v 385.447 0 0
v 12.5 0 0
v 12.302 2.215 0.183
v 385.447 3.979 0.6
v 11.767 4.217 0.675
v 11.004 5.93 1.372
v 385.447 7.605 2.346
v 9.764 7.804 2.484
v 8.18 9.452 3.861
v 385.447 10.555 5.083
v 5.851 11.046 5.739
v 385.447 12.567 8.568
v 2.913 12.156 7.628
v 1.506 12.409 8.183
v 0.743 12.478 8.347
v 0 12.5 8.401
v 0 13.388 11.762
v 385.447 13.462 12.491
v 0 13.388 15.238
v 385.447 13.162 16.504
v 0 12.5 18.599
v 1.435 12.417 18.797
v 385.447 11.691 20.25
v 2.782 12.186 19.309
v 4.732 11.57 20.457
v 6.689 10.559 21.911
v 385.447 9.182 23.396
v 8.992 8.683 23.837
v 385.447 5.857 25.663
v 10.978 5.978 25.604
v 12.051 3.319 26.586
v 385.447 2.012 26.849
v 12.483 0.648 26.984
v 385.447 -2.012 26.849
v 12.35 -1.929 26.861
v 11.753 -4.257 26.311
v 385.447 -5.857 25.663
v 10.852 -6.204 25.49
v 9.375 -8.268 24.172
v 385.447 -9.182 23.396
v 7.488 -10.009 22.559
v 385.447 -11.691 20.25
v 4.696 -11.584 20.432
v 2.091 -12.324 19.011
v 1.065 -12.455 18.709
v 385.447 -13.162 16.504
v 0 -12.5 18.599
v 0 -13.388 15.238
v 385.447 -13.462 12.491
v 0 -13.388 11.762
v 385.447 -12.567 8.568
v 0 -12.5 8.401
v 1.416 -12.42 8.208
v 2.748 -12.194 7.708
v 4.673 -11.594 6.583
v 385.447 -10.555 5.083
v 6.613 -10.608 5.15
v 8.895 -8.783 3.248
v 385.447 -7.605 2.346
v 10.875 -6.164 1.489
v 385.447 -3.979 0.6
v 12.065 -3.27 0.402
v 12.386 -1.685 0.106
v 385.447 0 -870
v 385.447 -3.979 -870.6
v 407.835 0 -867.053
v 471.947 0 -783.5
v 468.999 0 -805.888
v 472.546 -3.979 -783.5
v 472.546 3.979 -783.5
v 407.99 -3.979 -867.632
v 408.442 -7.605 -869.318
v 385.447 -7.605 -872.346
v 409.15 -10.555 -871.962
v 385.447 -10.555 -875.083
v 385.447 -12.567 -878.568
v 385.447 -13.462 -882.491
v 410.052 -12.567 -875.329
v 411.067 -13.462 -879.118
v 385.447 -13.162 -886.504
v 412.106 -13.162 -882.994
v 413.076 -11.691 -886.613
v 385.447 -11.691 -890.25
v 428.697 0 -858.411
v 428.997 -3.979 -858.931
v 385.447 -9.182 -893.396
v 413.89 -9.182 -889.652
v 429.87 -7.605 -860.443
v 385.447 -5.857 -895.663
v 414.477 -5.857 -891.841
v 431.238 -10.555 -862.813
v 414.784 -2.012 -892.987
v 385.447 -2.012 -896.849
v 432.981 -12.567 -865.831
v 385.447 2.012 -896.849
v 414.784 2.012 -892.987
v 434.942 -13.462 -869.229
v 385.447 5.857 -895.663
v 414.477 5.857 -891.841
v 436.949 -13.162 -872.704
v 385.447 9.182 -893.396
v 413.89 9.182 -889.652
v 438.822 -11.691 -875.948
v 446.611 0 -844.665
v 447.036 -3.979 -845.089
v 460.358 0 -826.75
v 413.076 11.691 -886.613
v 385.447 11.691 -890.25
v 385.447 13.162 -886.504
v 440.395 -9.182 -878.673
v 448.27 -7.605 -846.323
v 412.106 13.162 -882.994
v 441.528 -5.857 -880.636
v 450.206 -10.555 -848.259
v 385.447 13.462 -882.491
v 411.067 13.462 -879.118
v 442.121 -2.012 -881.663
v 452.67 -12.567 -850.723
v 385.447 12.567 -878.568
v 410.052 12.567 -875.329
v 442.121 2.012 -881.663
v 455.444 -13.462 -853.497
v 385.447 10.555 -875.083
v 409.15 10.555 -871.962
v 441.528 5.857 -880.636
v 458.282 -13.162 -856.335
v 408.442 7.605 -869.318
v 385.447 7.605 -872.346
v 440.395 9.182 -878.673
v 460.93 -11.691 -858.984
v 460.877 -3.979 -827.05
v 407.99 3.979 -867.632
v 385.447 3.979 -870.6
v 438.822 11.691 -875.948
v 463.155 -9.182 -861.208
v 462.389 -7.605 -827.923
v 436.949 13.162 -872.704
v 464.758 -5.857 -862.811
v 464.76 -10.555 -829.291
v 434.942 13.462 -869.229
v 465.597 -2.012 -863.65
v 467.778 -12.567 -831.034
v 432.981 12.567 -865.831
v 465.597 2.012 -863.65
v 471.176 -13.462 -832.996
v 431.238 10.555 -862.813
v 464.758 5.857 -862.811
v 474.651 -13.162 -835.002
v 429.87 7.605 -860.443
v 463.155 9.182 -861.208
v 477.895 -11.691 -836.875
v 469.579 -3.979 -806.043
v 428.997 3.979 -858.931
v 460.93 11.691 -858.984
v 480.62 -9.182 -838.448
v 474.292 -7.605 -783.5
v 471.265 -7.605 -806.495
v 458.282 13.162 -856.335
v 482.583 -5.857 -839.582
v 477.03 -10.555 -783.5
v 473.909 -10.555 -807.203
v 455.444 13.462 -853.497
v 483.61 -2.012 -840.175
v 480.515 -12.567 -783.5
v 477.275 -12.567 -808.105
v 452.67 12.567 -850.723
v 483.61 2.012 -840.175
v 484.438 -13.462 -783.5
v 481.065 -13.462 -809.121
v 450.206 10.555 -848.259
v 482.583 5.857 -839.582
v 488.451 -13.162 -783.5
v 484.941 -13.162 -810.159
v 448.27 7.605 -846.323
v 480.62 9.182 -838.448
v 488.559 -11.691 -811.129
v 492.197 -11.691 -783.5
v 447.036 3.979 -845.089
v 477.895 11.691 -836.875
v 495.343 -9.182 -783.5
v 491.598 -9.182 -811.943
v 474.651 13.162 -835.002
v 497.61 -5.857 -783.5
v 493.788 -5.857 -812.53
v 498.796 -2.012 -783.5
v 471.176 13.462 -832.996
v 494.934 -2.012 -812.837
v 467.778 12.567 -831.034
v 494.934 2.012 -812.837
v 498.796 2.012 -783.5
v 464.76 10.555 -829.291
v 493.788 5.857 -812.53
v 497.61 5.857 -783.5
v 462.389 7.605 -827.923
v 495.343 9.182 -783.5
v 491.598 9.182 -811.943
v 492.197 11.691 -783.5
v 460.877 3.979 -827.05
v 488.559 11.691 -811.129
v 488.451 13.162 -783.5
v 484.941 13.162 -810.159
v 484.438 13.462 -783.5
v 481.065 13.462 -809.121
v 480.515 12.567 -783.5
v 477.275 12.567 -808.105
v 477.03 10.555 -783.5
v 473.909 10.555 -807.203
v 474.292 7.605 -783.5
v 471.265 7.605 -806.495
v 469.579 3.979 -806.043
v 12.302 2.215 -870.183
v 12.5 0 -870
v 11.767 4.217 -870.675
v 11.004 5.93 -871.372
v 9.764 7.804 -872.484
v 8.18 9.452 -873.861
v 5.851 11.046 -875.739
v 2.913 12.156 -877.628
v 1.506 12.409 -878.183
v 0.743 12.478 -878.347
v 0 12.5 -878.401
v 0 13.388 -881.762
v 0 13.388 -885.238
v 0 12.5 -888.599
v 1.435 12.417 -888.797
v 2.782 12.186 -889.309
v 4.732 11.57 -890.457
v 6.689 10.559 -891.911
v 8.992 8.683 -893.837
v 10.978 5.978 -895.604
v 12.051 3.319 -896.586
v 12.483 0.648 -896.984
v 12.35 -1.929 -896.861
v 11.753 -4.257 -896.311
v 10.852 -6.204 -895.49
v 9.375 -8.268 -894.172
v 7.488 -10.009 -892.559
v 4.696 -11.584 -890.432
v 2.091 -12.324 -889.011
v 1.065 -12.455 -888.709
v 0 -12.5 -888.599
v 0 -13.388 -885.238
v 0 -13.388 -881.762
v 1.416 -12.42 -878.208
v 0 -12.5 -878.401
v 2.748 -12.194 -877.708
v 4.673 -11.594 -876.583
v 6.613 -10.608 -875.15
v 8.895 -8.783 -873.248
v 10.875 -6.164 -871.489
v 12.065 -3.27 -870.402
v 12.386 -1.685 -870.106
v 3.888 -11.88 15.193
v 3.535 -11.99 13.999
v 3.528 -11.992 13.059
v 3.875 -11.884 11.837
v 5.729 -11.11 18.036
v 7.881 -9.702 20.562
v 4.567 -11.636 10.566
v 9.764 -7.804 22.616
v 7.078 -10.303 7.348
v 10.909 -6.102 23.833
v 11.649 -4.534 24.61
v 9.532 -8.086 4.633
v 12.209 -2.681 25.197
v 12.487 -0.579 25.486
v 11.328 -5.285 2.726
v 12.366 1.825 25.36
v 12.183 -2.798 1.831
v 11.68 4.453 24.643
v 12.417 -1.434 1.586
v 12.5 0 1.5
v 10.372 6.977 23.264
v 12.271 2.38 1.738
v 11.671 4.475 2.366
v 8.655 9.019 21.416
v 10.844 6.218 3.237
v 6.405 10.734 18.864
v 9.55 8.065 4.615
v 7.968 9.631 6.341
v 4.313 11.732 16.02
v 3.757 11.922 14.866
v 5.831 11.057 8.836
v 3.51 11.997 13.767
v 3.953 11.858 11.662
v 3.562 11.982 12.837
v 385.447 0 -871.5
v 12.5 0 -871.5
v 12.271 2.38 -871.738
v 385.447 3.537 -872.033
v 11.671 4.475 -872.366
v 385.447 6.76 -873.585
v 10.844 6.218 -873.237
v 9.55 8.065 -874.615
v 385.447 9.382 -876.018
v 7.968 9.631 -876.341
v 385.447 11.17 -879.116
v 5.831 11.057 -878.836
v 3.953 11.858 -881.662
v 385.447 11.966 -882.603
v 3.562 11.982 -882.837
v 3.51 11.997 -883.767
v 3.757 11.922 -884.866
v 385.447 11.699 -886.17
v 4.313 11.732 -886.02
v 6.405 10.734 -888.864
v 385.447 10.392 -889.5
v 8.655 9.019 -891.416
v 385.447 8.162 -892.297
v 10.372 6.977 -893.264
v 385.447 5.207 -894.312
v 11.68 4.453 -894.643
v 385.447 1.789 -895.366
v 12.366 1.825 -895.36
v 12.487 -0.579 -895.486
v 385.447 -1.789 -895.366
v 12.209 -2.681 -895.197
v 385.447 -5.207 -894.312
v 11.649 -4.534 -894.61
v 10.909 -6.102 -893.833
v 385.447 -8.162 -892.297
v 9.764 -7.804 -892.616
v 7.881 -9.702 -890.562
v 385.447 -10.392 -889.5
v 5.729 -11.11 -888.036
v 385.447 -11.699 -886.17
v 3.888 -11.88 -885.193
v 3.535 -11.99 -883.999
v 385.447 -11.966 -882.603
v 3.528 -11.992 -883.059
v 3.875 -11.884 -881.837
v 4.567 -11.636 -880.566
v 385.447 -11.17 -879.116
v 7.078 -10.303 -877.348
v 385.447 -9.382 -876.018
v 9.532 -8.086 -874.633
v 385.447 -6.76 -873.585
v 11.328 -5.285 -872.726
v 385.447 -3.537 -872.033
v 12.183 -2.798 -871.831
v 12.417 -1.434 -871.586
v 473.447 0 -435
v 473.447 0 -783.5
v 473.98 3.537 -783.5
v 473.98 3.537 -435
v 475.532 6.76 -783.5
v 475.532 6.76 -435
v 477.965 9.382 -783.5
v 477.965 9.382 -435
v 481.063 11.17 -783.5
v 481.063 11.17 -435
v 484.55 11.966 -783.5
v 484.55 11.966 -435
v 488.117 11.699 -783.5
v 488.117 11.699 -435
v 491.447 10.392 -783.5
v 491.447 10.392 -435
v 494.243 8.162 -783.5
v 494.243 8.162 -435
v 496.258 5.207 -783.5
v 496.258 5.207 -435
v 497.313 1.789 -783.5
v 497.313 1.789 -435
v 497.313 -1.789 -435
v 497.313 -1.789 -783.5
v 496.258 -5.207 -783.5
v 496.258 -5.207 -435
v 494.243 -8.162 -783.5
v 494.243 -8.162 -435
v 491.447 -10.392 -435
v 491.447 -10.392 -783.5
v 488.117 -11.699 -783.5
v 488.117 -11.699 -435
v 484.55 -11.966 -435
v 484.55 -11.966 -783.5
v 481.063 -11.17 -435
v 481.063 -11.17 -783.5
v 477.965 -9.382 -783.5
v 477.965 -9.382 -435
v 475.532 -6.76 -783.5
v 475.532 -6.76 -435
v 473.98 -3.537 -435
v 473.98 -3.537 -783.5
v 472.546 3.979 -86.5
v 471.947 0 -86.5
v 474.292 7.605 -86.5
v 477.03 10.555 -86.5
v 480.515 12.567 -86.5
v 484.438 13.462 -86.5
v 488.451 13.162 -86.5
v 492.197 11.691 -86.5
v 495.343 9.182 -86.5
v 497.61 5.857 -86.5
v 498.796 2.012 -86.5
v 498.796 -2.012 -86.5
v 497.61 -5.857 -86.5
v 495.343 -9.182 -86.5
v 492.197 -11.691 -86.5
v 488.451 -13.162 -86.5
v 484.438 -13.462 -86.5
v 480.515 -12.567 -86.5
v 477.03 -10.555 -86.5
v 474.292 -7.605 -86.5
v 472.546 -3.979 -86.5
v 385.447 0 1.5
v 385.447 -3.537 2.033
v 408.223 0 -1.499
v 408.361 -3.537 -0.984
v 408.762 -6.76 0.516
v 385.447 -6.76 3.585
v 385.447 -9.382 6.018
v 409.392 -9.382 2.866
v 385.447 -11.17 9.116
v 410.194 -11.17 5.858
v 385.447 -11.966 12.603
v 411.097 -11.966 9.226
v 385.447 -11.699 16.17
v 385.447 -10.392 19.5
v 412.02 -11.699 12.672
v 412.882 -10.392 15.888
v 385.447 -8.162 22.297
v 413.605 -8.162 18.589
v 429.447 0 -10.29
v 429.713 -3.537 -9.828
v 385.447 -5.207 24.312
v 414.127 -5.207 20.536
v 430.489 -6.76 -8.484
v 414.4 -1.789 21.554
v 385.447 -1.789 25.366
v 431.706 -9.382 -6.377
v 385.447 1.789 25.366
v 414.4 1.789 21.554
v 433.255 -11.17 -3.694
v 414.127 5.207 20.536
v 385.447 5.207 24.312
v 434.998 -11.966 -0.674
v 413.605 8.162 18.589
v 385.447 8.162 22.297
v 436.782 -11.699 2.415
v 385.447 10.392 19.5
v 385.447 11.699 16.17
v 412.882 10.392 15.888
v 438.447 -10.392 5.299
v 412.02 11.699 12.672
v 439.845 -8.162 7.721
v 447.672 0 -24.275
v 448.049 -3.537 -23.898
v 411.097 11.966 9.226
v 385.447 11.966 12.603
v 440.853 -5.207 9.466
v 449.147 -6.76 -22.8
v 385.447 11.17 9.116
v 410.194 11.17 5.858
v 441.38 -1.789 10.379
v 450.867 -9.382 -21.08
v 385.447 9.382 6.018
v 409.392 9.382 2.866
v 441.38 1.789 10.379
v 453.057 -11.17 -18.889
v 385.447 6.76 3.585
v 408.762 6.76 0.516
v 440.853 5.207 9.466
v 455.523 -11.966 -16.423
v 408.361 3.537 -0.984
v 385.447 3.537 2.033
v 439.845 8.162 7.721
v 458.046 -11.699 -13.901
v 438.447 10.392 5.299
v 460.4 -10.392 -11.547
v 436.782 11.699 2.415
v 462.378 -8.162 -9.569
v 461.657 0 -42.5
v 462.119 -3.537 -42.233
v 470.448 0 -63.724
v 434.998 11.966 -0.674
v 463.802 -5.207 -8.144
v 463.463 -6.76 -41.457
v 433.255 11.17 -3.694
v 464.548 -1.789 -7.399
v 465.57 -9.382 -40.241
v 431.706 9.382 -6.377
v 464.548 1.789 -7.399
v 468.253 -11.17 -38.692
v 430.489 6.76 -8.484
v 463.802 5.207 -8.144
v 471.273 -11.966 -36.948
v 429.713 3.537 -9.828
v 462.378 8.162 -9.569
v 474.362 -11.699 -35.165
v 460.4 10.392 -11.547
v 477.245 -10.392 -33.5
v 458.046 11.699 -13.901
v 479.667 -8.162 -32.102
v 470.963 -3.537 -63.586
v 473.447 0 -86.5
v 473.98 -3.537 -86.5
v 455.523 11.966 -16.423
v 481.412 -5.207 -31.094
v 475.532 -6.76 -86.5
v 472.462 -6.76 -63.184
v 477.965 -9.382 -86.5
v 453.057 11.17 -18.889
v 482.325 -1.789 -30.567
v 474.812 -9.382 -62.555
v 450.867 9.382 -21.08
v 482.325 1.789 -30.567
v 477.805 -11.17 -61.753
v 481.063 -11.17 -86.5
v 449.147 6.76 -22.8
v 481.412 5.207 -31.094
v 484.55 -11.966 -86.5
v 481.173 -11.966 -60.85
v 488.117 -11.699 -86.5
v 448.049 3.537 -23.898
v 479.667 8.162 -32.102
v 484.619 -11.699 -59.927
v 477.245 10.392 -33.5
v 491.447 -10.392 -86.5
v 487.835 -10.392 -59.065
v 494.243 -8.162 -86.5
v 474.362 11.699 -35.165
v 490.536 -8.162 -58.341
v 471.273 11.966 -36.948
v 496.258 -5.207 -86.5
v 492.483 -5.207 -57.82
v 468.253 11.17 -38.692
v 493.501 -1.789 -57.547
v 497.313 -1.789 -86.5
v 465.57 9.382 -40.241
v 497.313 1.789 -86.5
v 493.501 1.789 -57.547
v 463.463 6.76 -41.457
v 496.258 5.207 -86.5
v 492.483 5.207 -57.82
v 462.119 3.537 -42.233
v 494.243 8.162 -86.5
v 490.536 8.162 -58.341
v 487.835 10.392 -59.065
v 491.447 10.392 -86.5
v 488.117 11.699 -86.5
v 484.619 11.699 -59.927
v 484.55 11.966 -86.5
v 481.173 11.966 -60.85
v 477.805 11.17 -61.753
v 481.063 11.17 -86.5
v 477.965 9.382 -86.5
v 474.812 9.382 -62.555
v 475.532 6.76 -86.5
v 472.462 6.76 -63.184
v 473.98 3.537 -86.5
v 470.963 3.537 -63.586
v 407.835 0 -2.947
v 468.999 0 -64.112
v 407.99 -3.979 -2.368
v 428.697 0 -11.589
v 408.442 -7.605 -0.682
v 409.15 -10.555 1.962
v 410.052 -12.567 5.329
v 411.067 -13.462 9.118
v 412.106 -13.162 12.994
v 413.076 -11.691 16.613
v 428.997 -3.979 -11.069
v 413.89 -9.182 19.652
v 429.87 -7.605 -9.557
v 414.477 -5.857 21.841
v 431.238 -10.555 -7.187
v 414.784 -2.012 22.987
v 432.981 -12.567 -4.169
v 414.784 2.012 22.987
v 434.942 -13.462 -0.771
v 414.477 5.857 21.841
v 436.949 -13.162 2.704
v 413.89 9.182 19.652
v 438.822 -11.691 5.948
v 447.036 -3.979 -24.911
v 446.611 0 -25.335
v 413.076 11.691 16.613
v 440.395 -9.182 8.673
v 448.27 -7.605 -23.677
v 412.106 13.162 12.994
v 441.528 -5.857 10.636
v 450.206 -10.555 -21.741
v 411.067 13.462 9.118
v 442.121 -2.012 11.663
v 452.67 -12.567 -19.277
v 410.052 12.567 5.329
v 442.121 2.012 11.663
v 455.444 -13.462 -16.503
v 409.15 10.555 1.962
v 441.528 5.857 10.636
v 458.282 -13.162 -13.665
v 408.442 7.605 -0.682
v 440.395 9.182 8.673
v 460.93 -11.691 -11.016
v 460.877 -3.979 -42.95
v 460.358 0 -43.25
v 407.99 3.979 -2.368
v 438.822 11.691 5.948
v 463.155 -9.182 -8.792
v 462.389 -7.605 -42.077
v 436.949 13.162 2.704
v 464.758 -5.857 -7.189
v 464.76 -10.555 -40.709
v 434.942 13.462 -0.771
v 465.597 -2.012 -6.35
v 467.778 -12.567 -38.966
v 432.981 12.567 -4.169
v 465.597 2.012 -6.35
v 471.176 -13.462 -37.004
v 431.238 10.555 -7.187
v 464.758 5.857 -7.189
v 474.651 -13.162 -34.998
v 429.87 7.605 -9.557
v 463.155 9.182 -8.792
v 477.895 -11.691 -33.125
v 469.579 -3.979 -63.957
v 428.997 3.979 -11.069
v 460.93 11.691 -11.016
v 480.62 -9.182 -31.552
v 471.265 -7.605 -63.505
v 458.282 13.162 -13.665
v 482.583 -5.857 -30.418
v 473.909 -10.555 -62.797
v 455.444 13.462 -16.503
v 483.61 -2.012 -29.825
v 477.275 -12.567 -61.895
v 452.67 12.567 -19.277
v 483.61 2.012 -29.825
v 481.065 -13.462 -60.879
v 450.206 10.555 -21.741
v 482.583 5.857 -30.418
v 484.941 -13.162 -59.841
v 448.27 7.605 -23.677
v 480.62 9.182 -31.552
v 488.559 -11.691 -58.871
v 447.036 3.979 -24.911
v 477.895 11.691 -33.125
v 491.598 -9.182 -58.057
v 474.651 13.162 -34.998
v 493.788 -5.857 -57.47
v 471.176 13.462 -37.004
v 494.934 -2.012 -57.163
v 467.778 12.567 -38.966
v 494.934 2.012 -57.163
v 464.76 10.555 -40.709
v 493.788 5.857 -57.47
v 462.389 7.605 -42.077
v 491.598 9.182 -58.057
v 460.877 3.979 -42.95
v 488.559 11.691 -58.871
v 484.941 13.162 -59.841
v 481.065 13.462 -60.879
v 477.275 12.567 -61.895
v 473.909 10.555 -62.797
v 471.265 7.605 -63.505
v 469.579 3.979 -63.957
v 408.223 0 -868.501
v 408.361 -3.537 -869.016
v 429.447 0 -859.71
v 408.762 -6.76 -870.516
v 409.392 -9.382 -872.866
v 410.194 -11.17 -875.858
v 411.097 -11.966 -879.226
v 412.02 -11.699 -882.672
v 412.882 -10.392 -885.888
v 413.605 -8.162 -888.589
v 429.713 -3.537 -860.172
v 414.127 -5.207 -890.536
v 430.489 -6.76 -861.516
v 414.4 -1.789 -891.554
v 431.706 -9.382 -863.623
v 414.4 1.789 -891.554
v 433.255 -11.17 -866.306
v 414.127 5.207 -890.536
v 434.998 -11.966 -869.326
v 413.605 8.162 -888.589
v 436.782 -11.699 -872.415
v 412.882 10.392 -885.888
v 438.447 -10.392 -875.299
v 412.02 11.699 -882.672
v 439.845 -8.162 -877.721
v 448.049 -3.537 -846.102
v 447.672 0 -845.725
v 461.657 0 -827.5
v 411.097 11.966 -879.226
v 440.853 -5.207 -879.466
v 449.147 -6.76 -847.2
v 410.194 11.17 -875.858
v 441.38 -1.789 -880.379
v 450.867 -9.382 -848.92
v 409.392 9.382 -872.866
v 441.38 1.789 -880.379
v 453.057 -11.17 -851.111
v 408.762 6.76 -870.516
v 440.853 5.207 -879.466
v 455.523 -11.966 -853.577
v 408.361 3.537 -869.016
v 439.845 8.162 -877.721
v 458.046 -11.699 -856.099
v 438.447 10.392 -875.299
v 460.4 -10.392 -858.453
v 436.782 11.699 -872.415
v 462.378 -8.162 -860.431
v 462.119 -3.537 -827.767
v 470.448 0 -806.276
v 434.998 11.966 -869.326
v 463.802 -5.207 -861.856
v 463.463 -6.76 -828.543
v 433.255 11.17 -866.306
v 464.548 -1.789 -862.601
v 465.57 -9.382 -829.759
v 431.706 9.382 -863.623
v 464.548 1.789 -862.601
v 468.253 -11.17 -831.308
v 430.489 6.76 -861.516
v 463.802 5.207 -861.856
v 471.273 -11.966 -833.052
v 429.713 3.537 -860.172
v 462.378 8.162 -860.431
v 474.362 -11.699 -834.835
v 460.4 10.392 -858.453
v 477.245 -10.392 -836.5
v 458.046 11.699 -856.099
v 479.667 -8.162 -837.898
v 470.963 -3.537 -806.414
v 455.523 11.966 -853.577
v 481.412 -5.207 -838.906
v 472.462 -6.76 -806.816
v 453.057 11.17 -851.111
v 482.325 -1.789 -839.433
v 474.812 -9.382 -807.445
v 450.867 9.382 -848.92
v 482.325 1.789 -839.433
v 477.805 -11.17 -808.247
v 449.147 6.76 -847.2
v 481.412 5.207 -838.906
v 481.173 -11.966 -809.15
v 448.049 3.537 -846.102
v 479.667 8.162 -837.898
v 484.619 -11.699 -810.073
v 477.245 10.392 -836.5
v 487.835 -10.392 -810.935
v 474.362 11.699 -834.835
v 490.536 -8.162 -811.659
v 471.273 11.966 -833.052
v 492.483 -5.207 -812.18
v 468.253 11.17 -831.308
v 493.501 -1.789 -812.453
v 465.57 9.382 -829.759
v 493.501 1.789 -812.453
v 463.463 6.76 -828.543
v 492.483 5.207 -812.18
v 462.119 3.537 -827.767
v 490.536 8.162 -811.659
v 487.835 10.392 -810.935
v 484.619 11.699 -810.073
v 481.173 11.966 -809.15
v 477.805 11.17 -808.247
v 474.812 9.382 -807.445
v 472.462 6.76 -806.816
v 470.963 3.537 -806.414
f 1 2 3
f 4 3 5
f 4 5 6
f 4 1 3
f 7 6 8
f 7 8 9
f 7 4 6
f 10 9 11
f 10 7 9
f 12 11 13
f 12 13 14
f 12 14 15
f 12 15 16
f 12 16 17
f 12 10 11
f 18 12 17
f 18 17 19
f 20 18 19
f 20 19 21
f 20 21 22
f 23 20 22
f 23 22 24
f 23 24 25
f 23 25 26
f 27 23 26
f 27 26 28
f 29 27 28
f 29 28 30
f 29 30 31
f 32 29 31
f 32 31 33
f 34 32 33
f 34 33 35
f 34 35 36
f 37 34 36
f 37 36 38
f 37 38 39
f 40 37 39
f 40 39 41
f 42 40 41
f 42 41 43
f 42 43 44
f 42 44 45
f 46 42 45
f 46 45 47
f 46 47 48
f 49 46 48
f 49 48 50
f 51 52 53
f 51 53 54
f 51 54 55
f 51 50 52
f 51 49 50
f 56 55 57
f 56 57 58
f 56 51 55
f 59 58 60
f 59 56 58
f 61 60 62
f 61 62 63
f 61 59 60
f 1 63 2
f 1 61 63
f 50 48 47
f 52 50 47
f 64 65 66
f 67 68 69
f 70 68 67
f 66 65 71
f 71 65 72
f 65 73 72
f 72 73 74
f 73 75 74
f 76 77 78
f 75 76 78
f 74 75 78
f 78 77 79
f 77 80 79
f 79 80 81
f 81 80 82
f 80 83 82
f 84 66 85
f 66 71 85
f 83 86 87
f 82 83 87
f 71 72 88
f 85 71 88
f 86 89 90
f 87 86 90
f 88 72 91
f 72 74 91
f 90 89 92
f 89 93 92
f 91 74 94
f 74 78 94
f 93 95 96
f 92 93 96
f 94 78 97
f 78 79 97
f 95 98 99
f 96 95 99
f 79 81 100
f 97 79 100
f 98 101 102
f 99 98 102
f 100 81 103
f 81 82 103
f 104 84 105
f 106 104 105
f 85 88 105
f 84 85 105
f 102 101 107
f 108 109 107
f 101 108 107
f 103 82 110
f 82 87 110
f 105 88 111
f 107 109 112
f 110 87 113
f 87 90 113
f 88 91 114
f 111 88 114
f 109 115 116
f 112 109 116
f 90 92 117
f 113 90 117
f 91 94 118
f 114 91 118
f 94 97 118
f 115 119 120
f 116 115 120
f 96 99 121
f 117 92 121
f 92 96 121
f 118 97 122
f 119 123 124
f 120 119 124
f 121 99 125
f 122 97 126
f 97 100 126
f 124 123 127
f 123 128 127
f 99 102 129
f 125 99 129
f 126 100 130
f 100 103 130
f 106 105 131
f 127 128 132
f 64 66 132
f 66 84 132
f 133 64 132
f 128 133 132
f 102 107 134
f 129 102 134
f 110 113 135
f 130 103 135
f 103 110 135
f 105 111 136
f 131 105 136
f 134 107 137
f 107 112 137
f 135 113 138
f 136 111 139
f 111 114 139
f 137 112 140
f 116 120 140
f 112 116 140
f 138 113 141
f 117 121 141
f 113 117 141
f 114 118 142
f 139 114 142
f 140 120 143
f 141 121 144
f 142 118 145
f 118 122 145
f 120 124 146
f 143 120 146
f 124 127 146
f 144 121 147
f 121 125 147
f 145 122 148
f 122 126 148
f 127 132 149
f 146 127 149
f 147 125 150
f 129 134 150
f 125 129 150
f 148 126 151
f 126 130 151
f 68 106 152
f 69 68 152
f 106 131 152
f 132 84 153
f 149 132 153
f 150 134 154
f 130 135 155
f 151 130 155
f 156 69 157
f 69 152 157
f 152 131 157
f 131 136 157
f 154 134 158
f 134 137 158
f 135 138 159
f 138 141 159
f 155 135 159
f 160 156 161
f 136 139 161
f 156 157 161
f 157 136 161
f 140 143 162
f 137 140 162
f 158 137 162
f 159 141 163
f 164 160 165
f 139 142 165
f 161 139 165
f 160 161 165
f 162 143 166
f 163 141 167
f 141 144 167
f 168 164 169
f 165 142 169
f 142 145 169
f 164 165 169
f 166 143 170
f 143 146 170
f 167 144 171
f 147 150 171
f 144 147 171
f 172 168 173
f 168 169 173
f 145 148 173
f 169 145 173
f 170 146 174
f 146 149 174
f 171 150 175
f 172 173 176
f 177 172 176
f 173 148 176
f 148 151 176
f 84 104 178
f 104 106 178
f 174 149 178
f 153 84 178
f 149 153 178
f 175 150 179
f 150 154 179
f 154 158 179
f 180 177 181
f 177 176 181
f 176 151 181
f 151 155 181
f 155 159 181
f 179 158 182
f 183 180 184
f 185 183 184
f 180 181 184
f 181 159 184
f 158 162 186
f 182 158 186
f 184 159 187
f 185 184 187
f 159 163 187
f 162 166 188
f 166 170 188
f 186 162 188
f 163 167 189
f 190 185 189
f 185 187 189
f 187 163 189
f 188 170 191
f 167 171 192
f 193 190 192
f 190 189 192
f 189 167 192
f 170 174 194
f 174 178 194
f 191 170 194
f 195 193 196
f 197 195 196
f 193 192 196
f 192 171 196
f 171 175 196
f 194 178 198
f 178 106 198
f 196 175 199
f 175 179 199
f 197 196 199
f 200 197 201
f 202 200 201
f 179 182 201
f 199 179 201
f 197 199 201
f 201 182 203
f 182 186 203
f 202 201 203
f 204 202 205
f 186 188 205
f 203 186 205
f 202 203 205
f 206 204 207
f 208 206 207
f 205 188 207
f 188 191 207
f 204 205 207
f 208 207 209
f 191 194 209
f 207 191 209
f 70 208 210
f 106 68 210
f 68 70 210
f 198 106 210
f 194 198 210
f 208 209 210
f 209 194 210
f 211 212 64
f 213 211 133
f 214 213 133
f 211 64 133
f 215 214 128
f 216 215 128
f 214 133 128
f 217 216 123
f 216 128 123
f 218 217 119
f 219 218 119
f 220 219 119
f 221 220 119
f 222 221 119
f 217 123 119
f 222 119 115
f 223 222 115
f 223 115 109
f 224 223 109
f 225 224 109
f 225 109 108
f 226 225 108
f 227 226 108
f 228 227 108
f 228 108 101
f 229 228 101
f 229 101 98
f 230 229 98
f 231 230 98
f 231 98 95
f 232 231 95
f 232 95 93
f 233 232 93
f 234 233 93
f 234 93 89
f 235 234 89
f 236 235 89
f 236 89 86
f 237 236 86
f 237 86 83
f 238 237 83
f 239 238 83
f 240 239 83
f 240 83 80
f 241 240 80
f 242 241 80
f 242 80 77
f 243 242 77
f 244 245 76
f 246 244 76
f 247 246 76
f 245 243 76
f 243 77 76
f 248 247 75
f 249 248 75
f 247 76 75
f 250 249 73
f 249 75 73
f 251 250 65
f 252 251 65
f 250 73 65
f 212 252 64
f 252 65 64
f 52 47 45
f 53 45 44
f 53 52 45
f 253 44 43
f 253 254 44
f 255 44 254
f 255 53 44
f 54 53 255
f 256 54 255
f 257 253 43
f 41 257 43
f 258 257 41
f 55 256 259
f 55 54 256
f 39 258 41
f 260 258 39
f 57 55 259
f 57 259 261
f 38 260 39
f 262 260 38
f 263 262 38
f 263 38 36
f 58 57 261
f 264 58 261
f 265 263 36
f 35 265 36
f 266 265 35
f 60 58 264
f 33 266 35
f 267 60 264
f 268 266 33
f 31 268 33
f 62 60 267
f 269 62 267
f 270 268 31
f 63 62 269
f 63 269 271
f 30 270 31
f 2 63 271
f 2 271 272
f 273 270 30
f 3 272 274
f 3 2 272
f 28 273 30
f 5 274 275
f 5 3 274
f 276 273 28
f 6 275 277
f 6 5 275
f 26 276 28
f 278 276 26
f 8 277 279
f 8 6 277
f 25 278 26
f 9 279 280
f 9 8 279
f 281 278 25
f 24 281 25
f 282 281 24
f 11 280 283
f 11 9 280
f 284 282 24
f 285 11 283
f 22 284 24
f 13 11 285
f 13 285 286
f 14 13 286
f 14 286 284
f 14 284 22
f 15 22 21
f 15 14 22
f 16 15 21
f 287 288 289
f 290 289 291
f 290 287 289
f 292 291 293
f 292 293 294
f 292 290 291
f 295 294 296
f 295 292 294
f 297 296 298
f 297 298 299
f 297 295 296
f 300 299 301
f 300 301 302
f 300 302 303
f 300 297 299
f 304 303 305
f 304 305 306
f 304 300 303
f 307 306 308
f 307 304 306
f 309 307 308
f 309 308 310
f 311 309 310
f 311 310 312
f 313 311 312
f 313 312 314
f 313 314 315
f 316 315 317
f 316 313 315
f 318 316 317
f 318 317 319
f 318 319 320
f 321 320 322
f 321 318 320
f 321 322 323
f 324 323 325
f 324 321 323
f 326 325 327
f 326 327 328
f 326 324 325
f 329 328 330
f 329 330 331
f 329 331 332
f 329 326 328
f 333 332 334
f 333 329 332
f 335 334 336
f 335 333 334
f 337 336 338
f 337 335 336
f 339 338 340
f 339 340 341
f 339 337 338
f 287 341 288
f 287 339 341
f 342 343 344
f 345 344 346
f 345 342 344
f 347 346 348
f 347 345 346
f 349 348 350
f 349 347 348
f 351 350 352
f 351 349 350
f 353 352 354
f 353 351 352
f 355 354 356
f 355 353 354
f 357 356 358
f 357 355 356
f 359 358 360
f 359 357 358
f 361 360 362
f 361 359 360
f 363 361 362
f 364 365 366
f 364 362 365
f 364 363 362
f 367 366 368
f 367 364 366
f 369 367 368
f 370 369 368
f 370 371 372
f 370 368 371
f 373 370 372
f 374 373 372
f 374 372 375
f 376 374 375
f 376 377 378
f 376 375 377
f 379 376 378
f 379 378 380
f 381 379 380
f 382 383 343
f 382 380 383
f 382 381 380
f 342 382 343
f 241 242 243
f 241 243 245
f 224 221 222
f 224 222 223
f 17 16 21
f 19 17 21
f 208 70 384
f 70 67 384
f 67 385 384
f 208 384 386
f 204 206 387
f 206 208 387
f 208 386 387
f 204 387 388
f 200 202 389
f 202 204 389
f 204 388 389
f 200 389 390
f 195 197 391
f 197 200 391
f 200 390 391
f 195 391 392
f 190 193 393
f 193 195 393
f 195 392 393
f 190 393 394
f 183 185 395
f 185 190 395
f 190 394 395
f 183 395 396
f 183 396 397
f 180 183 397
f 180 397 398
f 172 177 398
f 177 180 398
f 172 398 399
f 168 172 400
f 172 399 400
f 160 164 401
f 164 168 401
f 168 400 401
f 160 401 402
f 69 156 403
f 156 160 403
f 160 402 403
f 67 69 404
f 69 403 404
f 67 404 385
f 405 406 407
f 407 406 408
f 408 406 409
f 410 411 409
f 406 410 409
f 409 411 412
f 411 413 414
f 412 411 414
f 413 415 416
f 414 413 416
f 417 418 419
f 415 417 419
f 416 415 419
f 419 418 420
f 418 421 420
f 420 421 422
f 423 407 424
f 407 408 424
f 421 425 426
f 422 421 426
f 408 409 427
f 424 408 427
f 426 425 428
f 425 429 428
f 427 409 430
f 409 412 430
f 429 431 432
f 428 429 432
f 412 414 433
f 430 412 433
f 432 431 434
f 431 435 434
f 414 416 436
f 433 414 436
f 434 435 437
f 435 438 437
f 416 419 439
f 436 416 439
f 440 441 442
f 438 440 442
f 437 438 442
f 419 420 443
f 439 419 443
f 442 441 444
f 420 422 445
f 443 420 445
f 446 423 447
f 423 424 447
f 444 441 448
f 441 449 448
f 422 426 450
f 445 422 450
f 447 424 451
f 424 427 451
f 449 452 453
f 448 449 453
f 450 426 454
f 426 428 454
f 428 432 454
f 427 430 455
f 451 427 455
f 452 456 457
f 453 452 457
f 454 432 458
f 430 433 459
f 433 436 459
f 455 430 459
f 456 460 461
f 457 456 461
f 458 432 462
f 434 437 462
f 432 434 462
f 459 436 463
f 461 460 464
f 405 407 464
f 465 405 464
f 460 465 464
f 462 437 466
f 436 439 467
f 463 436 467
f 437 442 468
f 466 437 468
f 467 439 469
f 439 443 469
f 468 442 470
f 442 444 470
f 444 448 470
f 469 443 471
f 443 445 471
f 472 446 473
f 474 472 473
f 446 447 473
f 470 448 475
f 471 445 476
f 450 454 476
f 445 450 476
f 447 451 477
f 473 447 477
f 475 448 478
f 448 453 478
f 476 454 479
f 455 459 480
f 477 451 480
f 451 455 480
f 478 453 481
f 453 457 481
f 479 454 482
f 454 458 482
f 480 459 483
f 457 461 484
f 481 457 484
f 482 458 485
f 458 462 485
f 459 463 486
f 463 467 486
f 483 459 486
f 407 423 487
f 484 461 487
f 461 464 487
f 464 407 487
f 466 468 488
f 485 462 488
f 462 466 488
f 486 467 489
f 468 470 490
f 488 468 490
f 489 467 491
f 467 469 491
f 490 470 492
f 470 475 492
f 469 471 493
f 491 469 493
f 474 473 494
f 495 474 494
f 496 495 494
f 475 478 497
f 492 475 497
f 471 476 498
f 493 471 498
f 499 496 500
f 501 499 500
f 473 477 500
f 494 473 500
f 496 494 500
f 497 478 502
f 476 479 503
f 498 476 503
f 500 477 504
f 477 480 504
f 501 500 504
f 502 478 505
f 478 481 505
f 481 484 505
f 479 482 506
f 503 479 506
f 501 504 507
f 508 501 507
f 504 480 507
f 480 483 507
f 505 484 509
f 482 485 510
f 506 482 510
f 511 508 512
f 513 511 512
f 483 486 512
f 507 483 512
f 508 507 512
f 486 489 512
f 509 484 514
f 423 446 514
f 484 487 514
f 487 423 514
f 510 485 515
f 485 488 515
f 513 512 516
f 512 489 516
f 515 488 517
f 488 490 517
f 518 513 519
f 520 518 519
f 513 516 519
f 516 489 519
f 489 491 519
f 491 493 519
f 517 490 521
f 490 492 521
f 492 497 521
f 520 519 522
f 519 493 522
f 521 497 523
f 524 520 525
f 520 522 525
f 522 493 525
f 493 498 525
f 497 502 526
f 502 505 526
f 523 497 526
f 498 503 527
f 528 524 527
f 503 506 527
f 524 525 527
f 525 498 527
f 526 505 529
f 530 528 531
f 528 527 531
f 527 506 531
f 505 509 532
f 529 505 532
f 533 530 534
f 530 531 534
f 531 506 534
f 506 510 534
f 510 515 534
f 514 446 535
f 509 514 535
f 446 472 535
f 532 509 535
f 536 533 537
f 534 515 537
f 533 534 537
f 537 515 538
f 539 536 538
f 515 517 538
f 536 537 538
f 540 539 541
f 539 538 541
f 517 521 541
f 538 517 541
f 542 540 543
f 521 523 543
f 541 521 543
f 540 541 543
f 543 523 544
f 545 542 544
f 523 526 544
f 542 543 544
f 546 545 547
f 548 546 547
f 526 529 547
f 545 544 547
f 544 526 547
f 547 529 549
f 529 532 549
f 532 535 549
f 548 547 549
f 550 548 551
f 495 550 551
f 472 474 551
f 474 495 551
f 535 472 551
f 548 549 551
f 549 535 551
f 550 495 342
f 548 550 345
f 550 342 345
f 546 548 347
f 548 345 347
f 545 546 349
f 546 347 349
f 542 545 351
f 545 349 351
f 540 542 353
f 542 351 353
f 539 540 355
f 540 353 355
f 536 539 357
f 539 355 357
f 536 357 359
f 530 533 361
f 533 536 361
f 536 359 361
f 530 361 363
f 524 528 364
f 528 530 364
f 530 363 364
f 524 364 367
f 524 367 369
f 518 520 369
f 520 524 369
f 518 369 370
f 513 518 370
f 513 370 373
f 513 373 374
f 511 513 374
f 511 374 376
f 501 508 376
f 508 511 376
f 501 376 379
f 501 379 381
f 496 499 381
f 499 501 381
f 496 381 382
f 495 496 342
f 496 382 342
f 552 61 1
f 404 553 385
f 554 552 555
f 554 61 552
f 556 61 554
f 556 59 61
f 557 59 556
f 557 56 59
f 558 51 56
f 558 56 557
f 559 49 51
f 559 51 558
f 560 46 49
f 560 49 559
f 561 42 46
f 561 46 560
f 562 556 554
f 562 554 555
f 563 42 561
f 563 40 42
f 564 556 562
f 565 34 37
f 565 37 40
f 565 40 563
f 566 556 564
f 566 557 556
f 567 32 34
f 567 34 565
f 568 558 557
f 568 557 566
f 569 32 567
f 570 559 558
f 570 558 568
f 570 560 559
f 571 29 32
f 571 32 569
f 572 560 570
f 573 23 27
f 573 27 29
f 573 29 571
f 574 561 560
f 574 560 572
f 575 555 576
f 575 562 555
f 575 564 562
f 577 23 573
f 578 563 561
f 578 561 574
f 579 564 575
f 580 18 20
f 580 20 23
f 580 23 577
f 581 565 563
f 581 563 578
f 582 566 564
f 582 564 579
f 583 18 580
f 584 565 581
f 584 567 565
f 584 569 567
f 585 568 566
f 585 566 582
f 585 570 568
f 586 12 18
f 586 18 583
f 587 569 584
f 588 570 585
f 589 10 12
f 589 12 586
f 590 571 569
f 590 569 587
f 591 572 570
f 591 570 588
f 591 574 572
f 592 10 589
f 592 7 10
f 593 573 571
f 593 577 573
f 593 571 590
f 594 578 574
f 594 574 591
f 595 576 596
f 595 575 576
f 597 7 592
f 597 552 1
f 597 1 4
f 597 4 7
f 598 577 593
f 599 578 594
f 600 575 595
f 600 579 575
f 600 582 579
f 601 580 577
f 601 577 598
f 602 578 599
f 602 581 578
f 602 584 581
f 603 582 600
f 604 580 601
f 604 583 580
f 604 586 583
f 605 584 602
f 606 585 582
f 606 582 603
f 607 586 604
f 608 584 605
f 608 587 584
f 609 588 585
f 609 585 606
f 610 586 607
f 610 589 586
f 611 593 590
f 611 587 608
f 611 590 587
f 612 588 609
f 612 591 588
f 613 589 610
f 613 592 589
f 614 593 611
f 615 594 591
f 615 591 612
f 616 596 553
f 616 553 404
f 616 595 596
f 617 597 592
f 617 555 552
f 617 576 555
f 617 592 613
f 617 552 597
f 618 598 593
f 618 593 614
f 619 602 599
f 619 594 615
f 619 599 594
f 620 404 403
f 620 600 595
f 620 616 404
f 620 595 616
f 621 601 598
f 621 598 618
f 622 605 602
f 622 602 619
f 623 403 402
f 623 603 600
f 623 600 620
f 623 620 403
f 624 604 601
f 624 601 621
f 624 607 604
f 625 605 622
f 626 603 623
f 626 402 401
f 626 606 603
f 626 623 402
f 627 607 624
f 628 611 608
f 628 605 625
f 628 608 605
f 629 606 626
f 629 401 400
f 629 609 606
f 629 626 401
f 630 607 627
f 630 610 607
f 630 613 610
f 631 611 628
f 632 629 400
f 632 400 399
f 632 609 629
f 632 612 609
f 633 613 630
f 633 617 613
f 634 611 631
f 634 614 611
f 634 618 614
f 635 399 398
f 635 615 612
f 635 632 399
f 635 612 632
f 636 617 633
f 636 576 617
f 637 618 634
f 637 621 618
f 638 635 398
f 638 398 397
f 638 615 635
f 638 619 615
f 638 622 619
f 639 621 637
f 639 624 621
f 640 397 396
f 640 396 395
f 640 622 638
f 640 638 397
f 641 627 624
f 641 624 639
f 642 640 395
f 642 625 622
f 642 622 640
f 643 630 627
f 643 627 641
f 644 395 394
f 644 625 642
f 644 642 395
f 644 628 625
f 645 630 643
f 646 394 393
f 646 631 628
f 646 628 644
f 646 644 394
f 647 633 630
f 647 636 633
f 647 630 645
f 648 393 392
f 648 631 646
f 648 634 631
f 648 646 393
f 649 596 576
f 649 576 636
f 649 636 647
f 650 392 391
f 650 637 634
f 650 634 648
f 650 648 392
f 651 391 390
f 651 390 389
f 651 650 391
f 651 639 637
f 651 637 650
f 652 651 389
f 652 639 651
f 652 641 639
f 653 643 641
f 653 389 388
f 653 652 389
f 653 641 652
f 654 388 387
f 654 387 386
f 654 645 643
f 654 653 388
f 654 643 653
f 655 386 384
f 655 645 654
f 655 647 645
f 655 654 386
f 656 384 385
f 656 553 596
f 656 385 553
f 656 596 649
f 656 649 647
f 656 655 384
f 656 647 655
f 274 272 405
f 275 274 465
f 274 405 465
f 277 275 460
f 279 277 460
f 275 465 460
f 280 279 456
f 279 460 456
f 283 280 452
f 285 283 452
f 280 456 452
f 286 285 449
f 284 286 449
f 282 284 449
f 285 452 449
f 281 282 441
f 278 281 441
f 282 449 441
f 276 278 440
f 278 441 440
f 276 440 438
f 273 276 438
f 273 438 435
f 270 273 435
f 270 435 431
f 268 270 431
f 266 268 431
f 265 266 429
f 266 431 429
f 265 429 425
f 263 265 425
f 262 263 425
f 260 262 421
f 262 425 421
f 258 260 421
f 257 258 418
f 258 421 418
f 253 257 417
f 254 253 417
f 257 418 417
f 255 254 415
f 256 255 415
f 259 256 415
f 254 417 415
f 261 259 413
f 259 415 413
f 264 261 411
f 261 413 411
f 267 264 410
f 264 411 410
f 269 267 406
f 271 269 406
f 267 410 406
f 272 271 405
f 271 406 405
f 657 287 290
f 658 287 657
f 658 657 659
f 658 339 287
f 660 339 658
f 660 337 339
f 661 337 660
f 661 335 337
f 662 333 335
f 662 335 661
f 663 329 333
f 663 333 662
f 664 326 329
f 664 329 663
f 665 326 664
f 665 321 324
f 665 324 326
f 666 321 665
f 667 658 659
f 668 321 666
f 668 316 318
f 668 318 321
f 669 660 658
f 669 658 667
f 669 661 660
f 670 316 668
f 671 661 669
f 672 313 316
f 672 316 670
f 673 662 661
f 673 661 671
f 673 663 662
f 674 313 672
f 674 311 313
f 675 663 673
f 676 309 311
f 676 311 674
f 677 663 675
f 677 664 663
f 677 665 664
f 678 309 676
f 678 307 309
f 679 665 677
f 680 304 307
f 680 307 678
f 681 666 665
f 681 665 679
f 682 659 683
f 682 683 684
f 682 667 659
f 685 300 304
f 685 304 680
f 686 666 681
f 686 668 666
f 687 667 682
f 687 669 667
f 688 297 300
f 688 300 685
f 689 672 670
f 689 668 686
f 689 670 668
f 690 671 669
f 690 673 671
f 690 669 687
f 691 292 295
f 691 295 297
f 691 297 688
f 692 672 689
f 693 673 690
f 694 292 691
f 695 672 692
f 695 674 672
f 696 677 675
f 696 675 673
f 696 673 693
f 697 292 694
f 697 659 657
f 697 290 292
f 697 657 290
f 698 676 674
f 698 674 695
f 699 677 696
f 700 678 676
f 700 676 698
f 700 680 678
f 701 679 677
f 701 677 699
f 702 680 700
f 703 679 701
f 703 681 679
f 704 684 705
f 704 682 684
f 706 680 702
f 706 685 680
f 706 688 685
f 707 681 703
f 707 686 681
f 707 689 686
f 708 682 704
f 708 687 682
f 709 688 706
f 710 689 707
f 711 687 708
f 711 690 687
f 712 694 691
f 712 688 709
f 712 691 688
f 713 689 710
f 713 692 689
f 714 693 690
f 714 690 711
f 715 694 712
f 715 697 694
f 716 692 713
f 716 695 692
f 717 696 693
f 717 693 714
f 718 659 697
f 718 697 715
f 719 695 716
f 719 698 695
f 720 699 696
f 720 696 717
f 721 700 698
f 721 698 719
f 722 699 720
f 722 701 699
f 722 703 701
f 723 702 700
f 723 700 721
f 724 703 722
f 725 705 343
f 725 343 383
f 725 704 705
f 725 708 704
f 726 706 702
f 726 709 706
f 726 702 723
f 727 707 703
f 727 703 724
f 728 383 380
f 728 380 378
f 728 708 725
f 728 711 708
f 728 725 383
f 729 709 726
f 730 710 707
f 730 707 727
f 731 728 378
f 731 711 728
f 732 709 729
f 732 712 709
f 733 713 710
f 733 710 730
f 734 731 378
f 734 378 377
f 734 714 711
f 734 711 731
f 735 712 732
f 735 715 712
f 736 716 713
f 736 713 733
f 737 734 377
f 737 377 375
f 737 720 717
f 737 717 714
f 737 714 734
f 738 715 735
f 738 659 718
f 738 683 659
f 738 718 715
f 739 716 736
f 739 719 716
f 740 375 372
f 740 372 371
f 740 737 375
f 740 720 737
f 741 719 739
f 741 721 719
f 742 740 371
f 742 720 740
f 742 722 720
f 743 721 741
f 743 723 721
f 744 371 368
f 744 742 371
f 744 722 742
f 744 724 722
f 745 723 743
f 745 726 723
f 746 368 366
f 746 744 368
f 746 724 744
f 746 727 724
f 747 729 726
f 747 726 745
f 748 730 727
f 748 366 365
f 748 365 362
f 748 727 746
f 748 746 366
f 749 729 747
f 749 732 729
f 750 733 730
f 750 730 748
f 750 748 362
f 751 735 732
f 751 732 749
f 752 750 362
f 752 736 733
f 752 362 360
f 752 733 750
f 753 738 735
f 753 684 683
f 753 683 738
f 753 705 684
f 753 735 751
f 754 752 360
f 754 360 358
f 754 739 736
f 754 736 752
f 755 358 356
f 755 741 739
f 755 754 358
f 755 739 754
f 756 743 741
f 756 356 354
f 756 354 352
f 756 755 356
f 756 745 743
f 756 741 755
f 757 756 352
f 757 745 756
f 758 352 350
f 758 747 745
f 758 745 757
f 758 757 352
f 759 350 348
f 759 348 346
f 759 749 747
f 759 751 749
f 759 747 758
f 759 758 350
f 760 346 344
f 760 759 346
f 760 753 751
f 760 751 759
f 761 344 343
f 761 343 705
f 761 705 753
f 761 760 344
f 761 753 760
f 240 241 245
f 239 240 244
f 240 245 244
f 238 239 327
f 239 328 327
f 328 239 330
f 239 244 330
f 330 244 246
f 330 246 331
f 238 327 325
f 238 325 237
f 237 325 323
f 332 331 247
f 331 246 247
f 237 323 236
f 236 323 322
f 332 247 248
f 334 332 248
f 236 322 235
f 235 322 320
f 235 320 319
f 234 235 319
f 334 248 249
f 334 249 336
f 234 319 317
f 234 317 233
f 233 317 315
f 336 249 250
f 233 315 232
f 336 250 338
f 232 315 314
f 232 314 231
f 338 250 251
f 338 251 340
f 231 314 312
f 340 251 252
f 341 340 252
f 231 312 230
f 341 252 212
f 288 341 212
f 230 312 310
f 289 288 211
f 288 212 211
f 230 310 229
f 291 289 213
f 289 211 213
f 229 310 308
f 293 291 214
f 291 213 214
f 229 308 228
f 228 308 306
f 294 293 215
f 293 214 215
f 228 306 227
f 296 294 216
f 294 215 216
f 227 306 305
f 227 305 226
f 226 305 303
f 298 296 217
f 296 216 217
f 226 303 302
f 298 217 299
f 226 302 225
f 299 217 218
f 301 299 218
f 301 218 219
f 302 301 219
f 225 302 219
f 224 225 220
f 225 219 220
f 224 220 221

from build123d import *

# Parameters (mm, degrees)
SKETCH_1_R    = 13.5
SKETCH_1_R_2  = 12
OTHER_START   = -9e-09
OTHER_1_DEPTH = 27.000000009


# Read off the part's stored shape, not the designer's step: Полость1
with BuildPart() as part:
    # По траектории1: sweep along a path in Эскиз2
    with BuildLine(Plane(origin=(0, 0, 0), x_dir=(1, 0, 0), z_dir=(0, 1, 0))) as sweep_1_path:
        Line((0, -13.5), (385.446701658, -13.5))
        ThreePointArc((385.446701658, -13.5), (456.157379776, 15.789321881), (485.446701658, 86.5))
        Line((485.446701658, 86.5), (485.446701658, 435))
    # Эскиз1 → По траектории1 (sweep)
    with BuildSketch(Plane(origin=(0, 0, 0), x_dir=(0, 0, -1), z_dir=(1, 0, 0))):
        with Locations((-13.5, 0)):
            Circle(SKETCH_1_R)
        with Locations((-13.5, 0)):
            Circle(SKETCH_1_R_2, mode=Mode.SUBTRACT)
    sweep(path=sweep_1_path.line)

    # Полость1 outline → Полость1 (cut)
    with BuildSketch(Plane.XY.offset(OTHER_START)):
        with BuildLine():
            Line((0, 12.5), (0, -12.5))
            ThreePointArc((0, -12.5), (12.5, 0), (0, 12.5))
        make_face()
    extrude(amount=OTHER_1_DEPTH, mode=Mode.SUBTRACT)

    # Зеркальное отражение1: part across plane


with BuildPart() as part_1:
    add(part.part)
    add(part.part.mirror(Plane(origin=(485.446701658, 0, -435), x_dir=(1, 0, 0), z_dir=(0, 0, -1))))


solid = part_1.part
